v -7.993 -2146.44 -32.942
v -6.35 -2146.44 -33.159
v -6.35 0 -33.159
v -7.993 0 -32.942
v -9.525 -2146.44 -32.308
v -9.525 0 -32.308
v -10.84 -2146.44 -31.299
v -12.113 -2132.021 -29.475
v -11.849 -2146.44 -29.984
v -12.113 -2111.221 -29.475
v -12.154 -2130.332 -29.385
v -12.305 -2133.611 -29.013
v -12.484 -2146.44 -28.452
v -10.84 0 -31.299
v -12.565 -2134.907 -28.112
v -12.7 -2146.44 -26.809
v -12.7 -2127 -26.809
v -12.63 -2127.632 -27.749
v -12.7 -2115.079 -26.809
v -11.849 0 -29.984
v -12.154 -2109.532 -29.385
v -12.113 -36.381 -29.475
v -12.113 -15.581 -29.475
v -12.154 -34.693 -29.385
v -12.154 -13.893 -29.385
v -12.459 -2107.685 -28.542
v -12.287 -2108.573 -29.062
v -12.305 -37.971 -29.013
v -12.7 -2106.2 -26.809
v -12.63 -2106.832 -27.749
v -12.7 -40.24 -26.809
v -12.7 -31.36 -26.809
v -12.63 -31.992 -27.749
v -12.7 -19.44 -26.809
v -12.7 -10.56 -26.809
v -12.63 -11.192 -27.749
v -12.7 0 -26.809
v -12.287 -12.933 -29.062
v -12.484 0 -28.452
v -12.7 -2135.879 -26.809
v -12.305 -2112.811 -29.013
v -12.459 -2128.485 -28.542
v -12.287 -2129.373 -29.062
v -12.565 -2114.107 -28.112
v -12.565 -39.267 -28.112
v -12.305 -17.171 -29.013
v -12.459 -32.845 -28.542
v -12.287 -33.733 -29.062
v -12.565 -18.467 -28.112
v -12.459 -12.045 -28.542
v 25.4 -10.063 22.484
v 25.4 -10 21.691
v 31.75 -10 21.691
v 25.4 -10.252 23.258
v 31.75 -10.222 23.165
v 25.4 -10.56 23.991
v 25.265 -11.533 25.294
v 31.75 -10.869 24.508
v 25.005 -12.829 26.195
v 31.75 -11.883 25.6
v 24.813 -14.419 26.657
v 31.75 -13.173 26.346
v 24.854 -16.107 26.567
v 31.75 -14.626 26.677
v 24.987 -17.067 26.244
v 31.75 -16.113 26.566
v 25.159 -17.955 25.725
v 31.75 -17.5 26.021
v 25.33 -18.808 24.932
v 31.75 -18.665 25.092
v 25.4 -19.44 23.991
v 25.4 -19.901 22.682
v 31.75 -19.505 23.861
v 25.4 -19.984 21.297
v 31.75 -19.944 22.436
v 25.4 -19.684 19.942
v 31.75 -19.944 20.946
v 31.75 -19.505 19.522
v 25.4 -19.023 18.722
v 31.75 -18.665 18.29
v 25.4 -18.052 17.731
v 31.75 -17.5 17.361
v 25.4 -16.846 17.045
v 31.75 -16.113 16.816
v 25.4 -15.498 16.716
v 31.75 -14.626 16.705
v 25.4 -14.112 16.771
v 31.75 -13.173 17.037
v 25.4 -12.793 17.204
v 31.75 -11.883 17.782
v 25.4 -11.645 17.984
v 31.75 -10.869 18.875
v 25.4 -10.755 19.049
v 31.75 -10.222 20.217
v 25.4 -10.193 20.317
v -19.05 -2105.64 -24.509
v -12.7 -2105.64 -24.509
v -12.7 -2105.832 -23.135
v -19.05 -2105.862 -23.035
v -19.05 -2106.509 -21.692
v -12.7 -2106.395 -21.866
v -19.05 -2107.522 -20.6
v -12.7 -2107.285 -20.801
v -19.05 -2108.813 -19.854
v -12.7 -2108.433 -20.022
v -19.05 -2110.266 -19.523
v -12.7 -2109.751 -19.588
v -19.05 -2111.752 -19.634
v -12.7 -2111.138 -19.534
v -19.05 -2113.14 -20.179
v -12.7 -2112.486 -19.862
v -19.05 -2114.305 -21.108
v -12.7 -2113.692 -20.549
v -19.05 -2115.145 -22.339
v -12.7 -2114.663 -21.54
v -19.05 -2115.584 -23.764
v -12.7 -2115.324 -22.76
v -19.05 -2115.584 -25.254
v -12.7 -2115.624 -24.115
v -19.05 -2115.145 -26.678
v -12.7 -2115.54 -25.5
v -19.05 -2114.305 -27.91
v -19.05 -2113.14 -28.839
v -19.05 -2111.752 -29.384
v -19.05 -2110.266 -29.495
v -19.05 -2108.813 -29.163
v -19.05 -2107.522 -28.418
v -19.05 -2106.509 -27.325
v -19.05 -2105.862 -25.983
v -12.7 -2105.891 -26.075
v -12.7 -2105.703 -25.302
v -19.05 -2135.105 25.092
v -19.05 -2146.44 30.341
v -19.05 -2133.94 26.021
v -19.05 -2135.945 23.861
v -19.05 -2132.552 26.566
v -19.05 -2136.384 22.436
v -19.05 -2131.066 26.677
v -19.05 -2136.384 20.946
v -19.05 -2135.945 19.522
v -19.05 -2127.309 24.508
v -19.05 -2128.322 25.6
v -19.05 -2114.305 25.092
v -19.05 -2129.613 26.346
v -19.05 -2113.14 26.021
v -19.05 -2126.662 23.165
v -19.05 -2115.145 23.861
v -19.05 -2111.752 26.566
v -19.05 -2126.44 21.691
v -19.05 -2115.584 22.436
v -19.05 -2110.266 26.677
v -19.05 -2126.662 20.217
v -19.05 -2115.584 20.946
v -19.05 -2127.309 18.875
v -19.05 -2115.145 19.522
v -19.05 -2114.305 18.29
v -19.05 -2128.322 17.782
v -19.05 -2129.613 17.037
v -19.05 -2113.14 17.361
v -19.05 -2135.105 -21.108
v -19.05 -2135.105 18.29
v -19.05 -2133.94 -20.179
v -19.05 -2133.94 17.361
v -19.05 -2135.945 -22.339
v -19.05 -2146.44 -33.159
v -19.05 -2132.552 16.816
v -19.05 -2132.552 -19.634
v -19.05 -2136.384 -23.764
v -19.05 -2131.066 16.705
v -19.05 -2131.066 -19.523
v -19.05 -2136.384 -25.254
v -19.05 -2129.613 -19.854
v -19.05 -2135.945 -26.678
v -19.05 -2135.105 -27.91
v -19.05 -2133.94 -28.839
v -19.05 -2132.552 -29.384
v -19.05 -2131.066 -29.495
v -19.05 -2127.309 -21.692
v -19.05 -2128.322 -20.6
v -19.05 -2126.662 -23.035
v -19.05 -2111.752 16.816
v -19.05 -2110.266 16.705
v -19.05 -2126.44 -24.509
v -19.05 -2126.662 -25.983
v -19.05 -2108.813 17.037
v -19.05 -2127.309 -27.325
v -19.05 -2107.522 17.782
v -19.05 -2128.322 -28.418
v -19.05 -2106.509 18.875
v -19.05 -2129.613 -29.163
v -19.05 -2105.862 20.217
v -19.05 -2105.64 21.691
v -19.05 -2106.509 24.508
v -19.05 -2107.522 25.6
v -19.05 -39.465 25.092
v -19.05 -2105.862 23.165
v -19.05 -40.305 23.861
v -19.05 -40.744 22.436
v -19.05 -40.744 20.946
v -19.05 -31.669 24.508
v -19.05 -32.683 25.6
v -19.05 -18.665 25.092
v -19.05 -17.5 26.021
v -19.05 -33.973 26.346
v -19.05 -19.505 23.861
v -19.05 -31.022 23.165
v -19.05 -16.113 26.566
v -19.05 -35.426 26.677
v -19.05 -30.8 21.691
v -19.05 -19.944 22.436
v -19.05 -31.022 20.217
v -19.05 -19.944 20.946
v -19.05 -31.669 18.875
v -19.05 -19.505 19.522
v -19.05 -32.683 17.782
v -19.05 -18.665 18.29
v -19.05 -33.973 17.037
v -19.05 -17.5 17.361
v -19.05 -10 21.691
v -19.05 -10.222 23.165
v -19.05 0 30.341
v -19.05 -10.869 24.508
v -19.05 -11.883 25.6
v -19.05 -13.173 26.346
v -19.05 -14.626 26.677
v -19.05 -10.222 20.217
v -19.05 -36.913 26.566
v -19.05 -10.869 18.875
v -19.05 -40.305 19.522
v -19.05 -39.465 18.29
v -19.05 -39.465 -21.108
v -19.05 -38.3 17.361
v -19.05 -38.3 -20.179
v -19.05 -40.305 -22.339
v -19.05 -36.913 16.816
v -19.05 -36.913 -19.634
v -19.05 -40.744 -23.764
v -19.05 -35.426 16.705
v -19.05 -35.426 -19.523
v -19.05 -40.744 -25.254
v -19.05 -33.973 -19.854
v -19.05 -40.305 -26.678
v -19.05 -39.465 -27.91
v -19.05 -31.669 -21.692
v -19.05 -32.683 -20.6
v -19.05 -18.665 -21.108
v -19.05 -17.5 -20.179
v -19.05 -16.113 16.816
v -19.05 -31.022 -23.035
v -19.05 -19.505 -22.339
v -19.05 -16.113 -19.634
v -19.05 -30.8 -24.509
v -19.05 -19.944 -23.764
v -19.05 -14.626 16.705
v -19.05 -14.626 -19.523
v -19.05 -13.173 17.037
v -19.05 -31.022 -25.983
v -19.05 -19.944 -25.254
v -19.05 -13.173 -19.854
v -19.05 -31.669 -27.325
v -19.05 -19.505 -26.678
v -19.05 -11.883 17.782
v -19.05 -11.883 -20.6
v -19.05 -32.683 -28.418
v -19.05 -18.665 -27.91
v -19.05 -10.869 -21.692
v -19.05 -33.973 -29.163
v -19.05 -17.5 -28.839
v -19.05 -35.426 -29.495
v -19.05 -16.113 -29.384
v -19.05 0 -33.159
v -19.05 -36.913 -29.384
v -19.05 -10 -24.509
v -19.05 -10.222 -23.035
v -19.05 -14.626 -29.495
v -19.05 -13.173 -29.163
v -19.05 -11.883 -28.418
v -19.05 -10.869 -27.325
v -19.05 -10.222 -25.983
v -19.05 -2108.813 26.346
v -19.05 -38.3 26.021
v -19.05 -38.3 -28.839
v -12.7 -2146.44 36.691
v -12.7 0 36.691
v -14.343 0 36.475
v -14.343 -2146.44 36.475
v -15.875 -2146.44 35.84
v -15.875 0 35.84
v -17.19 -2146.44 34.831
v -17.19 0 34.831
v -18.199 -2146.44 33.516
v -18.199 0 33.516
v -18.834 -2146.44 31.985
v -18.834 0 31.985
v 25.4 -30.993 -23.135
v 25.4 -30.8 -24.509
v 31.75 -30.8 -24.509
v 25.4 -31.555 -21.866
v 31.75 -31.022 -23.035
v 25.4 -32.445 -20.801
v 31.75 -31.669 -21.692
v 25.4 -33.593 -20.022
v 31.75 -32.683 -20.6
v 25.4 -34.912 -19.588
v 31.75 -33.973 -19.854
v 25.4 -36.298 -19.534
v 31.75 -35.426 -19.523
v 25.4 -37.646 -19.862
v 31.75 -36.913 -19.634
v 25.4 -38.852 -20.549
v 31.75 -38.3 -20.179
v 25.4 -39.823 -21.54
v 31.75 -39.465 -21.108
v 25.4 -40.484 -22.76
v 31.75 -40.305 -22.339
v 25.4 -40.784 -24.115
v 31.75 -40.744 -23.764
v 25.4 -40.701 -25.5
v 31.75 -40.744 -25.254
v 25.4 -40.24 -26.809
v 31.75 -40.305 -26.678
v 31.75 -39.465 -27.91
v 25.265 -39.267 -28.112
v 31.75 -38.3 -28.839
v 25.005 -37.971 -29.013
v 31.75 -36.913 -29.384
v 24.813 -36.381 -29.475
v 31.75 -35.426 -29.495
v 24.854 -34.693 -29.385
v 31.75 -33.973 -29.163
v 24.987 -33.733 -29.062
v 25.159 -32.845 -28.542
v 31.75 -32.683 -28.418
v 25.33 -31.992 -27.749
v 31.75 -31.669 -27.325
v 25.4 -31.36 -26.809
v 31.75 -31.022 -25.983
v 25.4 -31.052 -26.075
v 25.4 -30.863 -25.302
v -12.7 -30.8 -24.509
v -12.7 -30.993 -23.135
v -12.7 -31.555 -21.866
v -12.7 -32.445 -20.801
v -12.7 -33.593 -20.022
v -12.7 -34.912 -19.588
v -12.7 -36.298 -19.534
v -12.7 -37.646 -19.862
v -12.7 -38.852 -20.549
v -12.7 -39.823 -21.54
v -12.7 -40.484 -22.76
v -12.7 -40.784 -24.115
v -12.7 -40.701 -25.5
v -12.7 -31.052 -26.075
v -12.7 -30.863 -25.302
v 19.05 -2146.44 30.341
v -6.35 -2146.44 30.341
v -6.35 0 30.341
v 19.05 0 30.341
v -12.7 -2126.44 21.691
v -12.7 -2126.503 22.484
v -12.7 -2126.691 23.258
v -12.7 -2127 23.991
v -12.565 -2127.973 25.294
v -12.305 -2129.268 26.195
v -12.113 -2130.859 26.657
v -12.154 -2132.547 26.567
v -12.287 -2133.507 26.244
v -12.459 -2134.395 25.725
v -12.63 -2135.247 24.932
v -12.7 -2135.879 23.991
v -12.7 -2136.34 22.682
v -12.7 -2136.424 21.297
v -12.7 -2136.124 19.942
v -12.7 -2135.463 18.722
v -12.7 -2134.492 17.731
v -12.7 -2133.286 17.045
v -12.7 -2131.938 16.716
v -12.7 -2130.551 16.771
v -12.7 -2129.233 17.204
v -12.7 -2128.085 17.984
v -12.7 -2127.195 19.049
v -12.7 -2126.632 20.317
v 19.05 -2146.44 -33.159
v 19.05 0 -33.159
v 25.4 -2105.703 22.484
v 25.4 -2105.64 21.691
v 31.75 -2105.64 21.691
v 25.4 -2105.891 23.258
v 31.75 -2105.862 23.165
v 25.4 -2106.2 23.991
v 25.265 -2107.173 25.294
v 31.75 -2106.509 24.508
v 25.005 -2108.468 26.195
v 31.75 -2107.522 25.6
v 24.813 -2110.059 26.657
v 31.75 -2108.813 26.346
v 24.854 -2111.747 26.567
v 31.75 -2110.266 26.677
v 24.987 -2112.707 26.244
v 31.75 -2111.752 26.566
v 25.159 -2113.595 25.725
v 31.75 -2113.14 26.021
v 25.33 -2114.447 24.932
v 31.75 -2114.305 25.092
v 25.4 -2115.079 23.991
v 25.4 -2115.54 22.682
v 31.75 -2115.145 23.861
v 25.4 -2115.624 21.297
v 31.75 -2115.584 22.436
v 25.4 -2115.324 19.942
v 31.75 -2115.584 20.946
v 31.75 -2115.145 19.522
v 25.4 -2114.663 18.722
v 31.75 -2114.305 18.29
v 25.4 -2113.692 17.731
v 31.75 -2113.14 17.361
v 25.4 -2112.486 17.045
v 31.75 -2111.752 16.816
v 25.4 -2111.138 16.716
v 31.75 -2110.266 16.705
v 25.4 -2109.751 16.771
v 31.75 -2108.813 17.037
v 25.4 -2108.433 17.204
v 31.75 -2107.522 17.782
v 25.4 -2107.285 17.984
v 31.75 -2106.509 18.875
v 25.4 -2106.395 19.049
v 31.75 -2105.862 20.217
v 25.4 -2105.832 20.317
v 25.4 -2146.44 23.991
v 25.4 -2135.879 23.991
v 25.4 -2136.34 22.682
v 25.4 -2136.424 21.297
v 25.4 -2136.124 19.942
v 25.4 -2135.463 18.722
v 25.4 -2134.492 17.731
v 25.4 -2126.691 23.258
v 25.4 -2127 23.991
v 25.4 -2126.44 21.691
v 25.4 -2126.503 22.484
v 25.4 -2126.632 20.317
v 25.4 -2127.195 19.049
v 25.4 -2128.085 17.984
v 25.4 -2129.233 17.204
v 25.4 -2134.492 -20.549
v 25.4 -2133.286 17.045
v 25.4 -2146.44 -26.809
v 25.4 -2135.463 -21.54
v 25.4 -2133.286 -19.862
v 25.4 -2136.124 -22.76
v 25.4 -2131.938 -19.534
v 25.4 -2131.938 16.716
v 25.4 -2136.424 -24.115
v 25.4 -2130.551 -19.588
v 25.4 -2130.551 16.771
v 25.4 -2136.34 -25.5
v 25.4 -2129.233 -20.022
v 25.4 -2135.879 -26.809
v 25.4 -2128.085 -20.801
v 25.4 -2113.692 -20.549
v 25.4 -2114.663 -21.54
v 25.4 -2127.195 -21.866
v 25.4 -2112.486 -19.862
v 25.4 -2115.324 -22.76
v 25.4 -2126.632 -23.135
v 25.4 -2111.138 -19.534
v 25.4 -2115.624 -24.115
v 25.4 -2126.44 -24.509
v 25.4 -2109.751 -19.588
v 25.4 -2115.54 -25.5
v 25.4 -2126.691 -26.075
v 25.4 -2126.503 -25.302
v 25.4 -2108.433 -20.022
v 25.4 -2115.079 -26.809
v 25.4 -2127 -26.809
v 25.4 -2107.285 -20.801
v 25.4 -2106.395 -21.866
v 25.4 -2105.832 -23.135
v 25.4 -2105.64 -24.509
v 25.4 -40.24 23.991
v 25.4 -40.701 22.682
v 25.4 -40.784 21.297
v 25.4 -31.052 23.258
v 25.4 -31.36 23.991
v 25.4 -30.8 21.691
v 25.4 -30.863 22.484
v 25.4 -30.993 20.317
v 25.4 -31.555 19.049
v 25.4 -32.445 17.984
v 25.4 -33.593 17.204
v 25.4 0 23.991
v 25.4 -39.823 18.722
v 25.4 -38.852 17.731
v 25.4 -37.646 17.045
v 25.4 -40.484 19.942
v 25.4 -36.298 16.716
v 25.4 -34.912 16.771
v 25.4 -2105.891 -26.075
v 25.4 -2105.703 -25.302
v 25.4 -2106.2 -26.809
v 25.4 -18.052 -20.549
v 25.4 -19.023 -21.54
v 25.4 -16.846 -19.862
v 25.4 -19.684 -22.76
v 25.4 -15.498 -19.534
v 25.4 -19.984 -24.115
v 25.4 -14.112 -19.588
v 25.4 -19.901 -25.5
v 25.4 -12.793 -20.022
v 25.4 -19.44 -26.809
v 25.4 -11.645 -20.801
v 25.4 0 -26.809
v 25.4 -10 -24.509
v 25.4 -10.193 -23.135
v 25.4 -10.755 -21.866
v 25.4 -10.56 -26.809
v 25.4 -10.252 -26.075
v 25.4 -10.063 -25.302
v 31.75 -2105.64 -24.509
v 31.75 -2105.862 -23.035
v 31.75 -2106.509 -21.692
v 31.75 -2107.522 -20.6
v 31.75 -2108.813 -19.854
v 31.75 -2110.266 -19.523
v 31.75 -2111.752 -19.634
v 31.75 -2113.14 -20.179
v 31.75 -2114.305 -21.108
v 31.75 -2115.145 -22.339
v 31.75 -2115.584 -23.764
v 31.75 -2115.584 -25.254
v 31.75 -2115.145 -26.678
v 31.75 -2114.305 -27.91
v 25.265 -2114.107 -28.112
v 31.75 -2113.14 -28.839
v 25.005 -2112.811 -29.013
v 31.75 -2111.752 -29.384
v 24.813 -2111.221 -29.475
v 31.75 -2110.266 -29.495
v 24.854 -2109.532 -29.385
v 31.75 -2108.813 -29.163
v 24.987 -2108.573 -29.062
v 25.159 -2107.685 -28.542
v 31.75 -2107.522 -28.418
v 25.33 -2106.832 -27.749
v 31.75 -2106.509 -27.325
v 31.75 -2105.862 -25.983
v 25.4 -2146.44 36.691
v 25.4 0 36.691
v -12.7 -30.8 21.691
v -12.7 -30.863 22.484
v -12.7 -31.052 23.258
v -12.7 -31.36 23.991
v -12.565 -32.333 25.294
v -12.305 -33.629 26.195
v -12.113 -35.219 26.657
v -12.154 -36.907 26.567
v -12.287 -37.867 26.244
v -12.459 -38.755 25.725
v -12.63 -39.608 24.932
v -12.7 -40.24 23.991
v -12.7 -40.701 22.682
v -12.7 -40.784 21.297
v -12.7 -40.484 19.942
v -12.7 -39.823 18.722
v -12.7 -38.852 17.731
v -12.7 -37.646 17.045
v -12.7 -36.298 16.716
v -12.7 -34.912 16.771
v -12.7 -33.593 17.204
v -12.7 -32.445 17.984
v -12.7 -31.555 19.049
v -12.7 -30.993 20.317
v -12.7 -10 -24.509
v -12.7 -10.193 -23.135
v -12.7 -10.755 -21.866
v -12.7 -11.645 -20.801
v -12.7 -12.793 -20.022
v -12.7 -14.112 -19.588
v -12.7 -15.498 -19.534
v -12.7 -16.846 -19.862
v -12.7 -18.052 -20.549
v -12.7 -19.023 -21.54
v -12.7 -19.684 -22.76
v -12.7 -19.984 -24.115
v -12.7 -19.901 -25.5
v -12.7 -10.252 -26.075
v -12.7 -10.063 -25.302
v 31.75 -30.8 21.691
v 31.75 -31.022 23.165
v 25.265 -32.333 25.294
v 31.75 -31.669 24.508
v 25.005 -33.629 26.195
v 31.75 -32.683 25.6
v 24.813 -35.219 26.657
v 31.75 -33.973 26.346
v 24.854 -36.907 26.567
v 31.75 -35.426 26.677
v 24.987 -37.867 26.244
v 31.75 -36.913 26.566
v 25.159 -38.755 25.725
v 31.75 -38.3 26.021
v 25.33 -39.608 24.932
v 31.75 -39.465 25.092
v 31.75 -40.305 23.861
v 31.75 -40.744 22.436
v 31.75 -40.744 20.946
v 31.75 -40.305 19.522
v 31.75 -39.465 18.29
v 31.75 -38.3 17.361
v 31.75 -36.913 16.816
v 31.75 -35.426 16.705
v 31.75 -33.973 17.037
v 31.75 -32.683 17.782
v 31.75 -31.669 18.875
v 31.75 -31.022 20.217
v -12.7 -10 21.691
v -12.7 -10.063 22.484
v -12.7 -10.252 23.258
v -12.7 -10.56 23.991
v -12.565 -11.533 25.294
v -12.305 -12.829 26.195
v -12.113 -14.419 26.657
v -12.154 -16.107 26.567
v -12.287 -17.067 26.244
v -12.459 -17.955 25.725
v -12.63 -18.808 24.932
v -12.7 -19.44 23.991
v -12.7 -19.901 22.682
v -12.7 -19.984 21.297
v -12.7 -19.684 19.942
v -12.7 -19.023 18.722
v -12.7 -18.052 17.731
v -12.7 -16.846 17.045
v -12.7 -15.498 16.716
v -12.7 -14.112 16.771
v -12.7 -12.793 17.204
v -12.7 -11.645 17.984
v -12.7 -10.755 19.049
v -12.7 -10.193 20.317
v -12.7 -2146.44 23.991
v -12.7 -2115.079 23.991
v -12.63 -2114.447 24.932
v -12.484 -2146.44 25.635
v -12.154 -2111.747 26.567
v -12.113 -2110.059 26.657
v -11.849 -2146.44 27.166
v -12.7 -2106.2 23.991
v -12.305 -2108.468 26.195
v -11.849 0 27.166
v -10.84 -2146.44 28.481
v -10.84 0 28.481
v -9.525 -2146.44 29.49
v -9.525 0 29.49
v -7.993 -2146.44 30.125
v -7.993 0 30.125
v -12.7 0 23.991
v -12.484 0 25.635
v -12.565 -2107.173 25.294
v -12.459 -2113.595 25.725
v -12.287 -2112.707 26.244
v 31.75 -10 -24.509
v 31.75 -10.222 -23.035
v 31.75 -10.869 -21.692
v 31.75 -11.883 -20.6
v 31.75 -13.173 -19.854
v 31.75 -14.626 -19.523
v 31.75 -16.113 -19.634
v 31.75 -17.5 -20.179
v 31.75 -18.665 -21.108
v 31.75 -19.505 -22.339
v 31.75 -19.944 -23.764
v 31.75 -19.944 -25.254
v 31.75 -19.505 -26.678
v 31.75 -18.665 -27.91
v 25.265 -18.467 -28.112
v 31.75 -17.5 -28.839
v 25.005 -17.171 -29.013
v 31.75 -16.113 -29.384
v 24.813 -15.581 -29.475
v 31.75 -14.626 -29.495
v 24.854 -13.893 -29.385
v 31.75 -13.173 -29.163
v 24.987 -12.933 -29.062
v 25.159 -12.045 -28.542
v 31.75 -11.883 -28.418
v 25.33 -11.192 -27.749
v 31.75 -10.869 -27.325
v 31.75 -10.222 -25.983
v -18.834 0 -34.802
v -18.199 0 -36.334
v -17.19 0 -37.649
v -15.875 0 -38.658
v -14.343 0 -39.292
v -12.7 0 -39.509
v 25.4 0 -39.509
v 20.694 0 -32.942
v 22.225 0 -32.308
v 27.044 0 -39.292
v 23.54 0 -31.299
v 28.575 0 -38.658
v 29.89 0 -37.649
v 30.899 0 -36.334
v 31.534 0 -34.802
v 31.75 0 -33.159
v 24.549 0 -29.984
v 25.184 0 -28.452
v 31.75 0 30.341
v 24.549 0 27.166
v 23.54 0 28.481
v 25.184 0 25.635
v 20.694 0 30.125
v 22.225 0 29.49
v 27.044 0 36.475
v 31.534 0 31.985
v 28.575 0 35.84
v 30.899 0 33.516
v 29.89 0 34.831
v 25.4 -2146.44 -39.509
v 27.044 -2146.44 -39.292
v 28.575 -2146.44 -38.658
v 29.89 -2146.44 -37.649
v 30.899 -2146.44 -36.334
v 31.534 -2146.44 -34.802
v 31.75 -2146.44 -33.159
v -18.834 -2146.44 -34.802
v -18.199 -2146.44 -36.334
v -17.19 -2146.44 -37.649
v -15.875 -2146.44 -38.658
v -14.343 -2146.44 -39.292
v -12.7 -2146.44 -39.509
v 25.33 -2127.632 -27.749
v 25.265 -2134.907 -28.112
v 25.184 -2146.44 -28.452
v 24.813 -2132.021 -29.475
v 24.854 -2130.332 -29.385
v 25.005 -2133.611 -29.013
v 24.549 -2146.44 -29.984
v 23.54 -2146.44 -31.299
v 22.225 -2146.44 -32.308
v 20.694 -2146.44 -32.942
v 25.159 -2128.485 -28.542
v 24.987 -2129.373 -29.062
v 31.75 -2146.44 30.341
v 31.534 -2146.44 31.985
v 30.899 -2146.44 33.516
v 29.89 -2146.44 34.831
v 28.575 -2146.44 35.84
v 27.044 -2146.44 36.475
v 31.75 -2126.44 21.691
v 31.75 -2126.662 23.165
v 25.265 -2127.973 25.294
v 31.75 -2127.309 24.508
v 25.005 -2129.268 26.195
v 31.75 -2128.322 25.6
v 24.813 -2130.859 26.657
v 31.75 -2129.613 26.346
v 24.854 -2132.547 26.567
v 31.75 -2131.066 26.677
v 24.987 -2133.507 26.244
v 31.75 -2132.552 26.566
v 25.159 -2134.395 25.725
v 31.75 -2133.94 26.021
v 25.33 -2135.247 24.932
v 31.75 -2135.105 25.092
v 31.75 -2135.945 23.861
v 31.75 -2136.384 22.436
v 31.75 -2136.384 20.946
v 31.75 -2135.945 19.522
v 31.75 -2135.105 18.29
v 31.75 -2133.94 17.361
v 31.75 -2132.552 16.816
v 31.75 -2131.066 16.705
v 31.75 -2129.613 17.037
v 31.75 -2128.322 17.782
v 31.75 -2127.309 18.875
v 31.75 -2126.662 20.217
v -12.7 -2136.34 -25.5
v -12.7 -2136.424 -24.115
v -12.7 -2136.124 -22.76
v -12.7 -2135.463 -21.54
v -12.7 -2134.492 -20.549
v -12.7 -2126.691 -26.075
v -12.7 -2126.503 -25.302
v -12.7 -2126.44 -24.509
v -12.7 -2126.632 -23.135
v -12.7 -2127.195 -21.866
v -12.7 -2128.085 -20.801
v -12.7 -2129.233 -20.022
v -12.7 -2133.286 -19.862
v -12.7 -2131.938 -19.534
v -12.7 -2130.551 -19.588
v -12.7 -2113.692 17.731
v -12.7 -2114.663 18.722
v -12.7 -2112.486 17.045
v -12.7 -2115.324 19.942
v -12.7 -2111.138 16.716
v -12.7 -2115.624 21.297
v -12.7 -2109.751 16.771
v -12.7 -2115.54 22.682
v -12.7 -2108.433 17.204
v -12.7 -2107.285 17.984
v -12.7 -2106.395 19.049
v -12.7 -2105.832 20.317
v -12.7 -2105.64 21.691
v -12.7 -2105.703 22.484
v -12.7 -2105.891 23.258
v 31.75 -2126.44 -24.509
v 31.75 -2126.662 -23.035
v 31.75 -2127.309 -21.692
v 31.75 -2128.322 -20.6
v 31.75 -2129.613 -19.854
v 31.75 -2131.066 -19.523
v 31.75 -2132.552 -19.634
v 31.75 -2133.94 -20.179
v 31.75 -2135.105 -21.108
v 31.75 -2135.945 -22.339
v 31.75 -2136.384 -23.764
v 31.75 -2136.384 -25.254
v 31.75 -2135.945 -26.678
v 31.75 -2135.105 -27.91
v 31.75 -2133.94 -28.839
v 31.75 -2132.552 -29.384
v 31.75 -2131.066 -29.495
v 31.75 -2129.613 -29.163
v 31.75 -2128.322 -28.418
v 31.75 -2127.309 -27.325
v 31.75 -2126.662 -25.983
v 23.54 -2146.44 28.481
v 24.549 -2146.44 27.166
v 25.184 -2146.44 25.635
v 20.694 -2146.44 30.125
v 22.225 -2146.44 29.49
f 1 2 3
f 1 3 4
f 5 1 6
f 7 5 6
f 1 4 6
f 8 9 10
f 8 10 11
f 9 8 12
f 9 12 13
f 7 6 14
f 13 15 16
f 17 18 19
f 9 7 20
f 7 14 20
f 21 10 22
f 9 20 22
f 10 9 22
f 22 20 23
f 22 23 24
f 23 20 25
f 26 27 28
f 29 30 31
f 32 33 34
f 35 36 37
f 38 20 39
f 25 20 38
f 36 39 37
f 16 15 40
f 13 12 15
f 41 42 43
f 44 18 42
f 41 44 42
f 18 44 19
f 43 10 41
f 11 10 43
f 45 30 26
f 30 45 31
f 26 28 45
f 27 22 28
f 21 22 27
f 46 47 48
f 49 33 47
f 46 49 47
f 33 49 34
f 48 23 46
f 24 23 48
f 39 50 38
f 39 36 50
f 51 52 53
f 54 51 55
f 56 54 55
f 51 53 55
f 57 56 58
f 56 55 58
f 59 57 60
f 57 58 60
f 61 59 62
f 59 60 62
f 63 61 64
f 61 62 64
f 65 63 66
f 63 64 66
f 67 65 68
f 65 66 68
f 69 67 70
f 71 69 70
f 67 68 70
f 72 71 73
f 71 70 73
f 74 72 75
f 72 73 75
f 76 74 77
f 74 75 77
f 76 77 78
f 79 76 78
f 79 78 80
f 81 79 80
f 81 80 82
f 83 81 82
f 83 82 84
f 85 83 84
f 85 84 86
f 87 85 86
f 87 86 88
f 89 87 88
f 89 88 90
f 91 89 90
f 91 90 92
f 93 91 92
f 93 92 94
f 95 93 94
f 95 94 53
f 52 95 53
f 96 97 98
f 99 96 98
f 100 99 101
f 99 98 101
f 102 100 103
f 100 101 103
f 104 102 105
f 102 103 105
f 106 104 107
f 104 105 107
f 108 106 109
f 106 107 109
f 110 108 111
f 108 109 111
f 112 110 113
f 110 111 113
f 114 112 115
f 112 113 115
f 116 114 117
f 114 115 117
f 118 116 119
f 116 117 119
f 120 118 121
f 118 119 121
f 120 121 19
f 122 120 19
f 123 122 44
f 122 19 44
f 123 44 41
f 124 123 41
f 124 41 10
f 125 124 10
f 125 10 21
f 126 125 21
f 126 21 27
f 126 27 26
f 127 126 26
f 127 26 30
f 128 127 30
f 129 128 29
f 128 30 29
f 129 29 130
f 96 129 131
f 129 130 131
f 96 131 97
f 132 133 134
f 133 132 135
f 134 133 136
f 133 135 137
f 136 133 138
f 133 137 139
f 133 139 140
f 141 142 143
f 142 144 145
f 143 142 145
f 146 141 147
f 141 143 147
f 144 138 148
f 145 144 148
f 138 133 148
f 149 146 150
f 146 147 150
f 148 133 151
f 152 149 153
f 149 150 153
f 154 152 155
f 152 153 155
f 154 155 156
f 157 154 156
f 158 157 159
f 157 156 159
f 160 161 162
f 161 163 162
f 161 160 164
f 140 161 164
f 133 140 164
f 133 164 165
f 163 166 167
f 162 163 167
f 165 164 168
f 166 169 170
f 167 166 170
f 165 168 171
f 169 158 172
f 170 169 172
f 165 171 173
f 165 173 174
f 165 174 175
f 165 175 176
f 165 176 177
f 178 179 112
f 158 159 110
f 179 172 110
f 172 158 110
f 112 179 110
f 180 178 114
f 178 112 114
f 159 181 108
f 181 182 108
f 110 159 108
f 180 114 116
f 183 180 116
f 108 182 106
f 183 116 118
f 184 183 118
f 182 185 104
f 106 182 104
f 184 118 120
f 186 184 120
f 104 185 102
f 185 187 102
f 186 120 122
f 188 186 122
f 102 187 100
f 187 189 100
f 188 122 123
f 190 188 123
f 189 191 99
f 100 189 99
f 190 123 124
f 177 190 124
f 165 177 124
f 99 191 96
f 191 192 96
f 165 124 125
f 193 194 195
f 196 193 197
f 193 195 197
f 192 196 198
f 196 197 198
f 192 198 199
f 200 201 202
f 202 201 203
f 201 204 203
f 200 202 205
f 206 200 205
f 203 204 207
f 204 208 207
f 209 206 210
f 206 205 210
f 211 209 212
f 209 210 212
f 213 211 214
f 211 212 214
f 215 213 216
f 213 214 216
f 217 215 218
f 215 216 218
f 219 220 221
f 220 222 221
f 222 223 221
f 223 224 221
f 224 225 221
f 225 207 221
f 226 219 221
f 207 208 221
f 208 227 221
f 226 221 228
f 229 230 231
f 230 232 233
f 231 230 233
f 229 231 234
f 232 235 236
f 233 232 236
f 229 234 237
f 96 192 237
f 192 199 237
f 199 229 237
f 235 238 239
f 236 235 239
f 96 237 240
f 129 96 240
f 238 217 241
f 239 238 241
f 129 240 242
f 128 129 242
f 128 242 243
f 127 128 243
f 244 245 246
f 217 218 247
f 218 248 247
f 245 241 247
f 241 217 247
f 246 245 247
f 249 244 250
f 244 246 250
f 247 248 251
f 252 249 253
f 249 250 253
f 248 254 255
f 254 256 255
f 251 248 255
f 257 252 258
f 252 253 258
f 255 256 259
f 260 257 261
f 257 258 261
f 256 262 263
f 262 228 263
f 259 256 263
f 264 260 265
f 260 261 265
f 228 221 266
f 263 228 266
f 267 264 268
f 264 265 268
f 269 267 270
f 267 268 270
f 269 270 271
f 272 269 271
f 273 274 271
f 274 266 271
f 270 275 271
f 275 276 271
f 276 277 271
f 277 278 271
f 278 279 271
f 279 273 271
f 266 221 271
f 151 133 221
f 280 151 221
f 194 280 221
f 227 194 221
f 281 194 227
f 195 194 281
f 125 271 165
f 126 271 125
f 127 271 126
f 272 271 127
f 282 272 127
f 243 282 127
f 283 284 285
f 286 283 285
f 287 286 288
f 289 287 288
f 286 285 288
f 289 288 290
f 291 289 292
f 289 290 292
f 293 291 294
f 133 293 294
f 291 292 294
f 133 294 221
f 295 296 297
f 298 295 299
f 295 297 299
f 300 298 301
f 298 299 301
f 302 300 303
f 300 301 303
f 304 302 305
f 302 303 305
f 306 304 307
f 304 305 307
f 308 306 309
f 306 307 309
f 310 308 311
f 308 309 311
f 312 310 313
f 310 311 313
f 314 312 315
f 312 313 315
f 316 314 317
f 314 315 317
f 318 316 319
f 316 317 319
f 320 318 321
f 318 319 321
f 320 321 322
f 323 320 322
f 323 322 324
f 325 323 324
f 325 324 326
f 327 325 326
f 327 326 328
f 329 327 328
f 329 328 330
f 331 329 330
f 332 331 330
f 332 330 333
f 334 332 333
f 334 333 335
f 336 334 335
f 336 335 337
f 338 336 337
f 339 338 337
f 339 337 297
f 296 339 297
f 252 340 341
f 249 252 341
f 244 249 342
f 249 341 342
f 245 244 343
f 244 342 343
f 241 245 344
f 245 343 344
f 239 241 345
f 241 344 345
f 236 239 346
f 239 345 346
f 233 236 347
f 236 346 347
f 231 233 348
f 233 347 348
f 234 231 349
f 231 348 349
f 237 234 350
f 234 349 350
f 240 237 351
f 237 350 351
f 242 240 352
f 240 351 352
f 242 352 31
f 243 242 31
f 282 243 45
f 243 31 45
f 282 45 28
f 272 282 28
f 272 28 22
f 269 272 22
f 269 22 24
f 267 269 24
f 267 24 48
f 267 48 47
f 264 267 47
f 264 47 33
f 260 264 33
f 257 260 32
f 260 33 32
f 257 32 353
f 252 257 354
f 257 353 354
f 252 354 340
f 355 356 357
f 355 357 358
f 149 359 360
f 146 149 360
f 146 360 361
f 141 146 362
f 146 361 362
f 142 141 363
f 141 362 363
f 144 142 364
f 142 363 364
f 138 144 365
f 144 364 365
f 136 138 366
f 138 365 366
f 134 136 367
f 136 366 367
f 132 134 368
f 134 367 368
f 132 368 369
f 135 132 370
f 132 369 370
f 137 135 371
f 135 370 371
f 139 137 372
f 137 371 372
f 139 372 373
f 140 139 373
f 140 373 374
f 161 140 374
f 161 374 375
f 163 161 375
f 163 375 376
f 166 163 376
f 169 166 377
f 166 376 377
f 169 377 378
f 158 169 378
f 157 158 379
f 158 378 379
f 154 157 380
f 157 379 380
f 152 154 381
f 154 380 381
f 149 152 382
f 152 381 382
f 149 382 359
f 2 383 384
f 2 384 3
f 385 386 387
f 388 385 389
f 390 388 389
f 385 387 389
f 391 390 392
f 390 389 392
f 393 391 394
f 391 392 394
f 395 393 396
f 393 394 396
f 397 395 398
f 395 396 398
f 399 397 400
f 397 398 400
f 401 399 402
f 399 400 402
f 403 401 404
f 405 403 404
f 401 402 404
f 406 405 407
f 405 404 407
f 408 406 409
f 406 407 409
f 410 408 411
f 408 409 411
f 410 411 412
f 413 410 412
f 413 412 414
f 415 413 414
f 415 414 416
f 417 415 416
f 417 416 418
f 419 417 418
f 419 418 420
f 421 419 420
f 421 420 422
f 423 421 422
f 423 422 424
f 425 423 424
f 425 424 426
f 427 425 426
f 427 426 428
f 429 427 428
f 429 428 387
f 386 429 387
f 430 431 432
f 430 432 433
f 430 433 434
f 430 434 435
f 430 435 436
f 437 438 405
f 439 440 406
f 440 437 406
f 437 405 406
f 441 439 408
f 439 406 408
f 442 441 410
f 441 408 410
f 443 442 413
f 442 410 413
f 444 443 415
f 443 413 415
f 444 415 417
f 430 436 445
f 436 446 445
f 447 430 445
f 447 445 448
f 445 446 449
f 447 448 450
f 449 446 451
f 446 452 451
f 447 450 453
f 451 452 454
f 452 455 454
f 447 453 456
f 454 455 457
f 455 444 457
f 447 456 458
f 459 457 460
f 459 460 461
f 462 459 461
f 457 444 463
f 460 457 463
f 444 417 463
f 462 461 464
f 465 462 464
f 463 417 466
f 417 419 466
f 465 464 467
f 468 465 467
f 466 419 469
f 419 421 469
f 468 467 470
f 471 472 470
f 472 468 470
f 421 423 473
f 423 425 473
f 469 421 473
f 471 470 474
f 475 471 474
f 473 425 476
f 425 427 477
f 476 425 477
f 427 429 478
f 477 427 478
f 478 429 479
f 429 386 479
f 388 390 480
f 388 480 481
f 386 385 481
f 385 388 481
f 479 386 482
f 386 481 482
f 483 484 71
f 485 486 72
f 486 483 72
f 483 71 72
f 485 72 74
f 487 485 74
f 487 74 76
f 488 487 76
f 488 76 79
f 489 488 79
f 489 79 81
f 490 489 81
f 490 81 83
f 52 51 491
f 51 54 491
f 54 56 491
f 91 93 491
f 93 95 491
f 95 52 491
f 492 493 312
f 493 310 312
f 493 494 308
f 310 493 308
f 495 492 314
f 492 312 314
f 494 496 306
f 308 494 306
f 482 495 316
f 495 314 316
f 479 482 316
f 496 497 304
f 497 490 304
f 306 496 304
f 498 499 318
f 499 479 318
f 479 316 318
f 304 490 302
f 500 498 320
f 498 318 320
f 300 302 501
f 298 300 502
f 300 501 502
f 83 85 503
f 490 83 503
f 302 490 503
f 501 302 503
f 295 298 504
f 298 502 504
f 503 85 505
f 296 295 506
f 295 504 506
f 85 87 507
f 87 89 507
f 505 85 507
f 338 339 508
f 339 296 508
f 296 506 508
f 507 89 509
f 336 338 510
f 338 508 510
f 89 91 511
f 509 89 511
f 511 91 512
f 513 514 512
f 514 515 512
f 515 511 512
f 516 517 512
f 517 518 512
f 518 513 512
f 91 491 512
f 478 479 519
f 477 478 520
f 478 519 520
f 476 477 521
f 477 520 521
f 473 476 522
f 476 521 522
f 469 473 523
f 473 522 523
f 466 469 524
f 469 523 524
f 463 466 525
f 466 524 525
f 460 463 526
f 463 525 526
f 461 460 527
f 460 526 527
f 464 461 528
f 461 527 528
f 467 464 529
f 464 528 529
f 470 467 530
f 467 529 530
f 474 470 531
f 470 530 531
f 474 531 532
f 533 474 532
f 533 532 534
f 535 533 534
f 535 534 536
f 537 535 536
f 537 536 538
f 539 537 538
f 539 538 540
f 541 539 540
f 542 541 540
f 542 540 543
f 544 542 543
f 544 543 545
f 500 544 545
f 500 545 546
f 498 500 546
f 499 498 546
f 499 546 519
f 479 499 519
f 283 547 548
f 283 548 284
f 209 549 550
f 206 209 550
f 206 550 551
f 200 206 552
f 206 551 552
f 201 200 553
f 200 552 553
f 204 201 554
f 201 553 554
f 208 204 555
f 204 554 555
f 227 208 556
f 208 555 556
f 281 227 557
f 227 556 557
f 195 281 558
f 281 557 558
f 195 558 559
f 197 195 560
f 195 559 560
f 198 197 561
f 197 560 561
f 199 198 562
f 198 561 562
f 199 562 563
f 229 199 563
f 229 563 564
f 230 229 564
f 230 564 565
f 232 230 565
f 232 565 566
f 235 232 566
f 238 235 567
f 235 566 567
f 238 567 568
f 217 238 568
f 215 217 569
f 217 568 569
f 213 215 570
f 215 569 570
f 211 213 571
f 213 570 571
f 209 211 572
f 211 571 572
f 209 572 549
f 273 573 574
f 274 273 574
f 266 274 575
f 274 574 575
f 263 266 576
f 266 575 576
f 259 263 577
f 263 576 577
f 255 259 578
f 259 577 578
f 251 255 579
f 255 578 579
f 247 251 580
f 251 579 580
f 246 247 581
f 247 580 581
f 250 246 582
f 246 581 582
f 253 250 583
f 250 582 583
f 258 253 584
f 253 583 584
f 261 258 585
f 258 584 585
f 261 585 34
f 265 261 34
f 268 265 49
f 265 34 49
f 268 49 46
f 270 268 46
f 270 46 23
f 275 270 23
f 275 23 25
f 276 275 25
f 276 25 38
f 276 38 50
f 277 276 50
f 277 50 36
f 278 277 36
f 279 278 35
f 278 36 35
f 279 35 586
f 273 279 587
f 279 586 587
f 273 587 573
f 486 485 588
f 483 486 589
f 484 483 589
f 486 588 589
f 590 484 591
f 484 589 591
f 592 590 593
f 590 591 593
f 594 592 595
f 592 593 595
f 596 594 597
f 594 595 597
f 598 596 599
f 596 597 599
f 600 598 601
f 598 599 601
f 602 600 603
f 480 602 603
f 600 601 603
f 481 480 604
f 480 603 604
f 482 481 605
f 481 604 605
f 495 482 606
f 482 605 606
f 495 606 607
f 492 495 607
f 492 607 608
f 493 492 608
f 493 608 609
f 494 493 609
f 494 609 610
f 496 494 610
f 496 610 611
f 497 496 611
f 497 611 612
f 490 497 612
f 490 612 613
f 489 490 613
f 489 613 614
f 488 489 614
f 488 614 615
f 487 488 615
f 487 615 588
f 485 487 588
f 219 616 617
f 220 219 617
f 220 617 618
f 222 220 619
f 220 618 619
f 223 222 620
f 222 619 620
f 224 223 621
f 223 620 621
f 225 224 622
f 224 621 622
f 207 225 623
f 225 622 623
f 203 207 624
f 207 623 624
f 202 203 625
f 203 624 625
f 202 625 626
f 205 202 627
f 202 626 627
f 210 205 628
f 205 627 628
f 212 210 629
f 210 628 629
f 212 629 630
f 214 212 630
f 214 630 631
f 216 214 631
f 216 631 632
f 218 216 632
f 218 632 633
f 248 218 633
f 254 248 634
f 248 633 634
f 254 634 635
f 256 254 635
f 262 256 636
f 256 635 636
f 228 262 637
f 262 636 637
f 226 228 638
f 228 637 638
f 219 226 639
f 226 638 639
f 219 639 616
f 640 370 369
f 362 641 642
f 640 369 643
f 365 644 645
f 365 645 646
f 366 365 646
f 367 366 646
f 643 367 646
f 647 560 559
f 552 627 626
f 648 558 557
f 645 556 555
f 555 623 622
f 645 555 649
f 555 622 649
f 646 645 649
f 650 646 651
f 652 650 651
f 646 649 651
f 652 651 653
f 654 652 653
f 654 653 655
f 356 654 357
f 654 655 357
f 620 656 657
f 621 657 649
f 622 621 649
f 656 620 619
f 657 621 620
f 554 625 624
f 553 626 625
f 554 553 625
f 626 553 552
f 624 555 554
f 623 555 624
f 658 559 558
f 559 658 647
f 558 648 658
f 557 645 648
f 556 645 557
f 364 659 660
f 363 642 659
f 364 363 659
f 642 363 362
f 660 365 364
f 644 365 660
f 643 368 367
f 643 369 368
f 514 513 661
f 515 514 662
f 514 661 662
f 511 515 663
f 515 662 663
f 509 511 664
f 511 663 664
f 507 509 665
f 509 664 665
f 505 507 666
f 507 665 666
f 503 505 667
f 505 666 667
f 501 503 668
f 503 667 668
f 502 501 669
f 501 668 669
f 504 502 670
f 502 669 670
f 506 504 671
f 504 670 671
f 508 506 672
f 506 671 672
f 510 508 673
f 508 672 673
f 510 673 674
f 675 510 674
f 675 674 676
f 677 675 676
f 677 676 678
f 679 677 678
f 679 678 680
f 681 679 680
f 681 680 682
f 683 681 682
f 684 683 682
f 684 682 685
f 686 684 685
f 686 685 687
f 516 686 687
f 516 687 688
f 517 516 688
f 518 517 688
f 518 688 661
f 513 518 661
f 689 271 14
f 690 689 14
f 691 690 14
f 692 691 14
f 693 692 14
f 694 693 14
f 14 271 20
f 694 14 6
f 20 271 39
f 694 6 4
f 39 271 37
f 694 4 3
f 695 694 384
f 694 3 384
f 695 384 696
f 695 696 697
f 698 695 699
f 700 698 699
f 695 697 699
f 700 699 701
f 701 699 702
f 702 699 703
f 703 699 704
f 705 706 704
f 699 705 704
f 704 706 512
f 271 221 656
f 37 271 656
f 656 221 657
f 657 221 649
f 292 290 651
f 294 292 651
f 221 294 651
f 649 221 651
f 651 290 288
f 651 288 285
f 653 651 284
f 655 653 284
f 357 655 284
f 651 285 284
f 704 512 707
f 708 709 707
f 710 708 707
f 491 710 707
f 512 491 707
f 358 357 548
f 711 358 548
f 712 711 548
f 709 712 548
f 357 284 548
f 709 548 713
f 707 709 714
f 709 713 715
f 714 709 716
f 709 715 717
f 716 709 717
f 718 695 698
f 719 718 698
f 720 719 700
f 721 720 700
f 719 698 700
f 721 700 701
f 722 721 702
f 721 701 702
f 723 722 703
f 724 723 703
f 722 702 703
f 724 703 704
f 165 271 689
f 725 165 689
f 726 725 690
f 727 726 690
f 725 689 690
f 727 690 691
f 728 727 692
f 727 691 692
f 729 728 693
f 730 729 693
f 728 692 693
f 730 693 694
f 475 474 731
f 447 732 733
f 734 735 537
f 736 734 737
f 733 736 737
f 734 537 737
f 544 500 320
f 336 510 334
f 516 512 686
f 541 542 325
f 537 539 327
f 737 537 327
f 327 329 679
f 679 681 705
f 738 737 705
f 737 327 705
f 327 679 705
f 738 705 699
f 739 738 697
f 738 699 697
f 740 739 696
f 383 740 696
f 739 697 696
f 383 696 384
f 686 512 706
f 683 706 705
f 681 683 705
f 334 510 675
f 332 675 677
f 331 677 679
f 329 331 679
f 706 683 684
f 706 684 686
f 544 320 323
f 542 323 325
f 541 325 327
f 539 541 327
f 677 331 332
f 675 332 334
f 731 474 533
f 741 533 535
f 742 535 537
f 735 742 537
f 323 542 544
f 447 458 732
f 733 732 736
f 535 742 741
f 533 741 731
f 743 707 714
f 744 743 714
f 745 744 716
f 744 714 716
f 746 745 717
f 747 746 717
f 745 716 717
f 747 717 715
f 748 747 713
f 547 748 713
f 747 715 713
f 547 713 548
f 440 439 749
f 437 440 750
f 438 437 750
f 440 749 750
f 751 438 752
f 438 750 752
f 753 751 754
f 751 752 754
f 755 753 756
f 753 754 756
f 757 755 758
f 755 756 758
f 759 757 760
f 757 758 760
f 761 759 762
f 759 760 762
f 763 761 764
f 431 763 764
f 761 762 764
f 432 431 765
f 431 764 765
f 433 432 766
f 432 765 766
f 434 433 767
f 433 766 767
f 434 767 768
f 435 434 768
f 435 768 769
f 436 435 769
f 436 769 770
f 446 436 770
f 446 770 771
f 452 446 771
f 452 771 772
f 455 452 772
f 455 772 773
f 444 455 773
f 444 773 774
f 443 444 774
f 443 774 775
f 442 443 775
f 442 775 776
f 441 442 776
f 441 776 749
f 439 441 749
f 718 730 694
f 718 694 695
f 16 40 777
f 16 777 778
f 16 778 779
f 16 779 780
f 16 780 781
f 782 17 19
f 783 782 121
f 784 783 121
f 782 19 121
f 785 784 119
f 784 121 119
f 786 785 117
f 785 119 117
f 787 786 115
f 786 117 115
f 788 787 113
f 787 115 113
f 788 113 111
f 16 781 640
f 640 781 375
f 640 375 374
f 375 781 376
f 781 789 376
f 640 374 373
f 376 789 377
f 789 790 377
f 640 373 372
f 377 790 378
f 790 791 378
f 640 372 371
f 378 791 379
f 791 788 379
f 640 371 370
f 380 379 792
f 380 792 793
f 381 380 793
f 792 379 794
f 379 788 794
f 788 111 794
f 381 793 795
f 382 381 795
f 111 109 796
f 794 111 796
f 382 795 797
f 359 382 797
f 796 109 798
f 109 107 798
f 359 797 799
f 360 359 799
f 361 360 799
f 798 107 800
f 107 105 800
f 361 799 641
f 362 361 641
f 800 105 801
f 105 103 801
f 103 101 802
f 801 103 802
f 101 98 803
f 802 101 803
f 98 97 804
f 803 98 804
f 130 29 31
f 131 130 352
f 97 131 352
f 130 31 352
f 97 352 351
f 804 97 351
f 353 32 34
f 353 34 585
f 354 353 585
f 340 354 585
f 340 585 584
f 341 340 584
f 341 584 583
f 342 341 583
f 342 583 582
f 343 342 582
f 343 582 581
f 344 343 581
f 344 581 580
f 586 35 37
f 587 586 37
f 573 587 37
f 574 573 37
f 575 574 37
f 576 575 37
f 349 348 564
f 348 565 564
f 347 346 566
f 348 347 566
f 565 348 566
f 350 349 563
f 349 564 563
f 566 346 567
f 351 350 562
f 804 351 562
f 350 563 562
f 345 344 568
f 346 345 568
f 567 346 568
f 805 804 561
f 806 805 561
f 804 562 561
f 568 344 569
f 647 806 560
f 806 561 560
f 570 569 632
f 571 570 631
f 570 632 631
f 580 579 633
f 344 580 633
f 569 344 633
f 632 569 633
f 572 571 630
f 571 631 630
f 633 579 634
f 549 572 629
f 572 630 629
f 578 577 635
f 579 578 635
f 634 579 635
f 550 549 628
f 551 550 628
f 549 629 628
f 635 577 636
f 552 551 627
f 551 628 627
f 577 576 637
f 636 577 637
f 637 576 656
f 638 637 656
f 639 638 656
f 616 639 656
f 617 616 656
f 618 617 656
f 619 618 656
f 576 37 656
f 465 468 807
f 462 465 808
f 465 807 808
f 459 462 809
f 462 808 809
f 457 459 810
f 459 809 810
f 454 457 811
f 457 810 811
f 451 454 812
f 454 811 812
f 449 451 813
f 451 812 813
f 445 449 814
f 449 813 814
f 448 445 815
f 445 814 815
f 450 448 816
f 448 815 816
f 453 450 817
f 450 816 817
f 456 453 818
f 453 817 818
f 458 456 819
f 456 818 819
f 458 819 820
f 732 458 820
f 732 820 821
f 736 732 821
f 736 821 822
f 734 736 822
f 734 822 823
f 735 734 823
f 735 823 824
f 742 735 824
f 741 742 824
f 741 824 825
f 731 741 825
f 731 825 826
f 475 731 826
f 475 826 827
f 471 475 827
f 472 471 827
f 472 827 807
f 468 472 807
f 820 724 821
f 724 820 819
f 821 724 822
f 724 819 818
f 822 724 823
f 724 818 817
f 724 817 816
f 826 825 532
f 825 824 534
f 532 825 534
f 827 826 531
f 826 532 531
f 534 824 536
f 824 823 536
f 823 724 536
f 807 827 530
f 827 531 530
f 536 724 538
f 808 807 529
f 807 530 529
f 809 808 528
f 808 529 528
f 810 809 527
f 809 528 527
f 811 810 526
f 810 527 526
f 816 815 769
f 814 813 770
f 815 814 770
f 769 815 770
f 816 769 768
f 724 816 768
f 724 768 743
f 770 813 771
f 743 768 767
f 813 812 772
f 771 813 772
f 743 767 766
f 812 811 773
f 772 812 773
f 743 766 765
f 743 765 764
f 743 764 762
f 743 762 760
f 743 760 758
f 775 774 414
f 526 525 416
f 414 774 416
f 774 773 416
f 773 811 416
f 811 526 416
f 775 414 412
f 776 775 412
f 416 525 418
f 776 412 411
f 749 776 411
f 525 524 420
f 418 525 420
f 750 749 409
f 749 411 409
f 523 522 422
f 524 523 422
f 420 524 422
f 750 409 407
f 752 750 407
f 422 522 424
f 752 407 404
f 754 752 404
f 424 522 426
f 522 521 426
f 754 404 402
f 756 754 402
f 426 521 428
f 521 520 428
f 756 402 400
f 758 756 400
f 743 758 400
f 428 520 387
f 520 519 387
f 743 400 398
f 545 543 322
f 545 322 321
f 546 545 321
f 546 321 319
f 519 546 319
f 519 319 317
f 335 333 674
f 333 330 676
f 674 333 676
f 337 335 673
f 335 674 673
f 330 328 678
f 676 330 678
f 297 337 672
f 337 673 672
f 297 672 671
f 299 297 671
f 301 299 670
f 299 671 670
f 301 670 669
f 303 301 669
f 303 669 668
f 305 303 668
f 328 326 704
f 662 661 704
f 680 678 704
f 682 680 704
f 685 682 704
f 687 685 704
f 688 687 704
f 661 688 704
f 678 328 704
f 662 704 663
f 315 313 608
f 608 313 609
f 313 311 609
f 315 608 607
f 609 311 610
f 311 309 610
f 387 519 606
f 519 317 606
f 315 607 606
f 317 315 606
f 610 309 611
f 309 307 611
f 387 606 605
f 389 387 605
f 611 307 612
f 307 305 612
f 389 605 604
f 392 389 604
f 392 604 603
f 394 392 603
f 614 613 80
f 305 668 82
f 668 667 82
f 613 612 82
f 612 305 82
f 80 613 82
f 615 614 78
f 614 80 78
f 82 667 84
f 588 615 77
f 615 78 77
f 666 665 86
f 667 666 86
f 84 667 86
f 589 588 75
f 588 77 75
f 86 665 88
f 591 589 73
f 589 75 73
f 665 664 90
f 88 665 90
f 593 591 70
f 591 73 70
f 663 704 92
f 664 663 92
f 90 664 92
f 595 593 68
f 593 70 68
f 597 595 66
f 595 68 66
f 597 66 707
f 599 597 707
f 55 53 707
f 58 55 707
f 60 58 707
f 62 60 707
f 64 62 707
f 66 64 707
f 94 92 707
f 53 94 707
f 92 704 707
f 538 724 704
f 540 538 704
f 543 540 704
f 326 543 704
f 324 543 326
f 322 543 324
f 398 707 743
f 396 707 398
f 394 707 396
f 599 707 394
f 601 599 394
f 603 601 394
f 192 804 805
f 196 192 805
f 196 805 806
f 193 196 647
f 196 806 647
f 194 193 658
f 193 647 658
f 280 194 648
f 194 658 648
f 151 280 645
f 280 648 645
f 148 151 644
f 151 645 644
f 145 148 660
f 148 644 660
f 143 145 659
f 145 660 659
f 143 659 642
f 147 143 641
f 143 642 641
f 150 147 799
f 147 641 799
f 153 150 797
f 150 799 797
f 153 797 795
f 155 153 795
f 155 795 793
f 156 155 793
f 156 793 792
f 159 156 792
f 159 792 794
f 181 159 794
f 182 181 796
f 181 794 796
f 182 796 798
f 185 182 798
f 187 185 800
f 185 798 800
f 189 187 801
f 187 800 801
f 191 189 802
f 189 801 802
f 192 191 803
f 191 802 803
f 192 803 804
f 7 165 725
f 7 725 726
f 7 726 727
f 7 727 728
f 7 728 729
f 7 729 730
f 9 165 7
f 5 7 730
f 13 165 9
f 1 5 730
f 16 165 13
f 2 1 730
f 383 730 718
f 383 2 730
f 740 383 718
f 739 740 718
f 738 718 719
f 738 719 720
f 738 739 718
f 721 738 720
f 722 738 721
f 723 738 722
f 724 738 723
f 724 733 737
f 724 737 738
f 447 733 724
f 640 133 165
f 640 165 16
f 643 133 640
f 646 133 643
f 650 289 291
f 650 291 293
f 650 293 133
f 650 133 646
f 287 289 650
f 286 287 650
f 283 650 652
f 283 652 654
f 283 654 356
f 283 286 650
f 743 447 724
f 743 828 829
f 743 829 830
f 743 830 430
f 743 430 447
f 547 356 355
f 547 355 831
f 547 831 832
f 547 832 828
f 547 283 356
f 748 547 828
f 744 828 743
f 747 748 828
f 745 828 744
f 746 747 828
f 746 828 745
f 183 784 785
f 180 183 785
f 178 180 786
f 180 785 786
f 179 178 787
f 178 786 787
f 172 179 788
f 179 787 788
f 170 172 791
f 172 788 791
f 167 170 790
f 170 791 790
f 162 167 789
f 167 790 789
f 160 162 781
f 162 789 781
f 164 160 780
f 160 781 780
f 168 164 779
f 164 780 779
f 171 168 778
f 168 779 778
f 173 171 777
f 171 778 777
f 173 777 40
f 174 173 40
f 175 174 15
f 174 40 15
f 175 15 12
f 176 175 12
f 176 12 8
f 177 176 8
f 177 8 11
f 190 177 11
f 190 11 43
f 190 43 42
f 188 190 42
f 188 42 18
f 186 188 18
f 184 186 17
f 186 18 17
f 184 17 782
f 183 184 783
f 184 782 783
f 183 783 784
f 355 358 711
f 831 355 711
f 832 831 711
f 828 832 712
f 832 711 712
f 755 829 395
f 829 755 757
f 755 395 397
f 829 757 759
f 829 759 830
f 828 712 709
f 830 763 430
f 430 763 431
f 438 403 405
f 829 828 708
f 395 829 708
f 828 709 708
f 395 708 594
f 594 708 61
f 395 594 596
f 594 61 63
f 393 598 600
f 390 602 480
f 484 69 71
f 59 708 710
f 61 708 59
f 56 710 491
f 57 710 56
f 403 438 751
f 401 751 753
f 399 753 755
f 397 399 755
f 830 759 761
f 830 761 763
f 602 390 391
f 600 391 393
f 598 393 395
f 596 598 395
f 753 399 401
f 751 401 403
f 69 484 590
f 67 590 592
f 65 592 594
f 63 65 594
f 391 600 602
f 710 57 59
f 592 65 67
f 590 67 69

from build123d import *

# Parameters (mm, degrees)
F1_DEPTH = 2146.4397
F2_R     = 5
F3_DEPTH = 50.801


with BuildPart() as f1:
    # F0 (on Front) → F1 (new body)
    with BuildSketch(Plane.XZ):
        with BuildLine():
            Line((25.400001, 36.691132), (-12.699999, 36.691132))
            ThreePointArc((-12.699999, 36.691132), (-17.190127, 34.83126), (-19.049999, 30.341132))
            Line((-19.049999, 30.341132), (-19.049999, -33.158868))
            ThreePointArc((-19.049999, -33.158868), (-17.190127, -37.648996), (-12.699999, -39.508868))
            Line((-12.699999, -39.508868), (25.400001, -39.508868))
            ThreePointArc((25.400001, -39.508868), (29.890129, -37.648996), (31.750001, -33.158868))
            Line((31.750001, -33.158868), (31.750001, 30.341132))
            ThreePointArc((31.750001, 30.341132), (29.890129, 34.83126), (25.400001, 36.691132))
        make_face()
        with BuildLine():
            ThreePointArc((-12.699999, 23.991132), (-10.840127, 28.48126), (-6.349999, 30.341132))
            Line((-6.349999, 30.341132), (19.050001, 30.341132))
            ThreePointArc((19.050001, 30.341132), (23.540129, 28.48126), (25.400001, 23.991132))
            Line((25.400001, 23.991132), (25.400001, -26.808868))
            ThreePointArc((25.400001, -26.808868), (23.540129, -31.298996), (19.050001, -33.158868))
            Line((19.050001, -33.158868), (-6.349999, -33.158868))
            ThreePointArc((-6.349999, -33.158868), (-10.840127, -31.298996), (-12.699999, -26.808868))
            Line((-12.699999, -26.808868), (-12.699999, 23.991132))
        make_face(mode=Mode.SUBTRACT)
    extrude(amount=F1_DEPTH)

    # F2 (on face) → F3 (cut, through all)
    with BuildSketch(Plane.YZ.offset(31.750001)):
        with Locations((-2131.4397, 21.691132)):
            Circle(F2_R)
        with Locations((-2110.6397, 21.691132)):
            Circle(F2_R)
        with Locations((-2131.4397, -24.508868)):
            Circle(F2_R)
        with Locations((-2110.6397, -24.508868)):
            Circle(F2_R)
        with Locations((-35.8, 21.691132)):
            Circle(F2_R)
        with Locations((-35.8, -24.508868)):
            Circle(F2_R)
        with Locations((-15, 21.691132)):
            Circle(F2_R)
        with Locations((-15, -24.508868)):
            Circle(F2_R)
    extrude(amount=-F3_DEPTH, mode=Mode.SUBTRACT)


solid = f1.part
